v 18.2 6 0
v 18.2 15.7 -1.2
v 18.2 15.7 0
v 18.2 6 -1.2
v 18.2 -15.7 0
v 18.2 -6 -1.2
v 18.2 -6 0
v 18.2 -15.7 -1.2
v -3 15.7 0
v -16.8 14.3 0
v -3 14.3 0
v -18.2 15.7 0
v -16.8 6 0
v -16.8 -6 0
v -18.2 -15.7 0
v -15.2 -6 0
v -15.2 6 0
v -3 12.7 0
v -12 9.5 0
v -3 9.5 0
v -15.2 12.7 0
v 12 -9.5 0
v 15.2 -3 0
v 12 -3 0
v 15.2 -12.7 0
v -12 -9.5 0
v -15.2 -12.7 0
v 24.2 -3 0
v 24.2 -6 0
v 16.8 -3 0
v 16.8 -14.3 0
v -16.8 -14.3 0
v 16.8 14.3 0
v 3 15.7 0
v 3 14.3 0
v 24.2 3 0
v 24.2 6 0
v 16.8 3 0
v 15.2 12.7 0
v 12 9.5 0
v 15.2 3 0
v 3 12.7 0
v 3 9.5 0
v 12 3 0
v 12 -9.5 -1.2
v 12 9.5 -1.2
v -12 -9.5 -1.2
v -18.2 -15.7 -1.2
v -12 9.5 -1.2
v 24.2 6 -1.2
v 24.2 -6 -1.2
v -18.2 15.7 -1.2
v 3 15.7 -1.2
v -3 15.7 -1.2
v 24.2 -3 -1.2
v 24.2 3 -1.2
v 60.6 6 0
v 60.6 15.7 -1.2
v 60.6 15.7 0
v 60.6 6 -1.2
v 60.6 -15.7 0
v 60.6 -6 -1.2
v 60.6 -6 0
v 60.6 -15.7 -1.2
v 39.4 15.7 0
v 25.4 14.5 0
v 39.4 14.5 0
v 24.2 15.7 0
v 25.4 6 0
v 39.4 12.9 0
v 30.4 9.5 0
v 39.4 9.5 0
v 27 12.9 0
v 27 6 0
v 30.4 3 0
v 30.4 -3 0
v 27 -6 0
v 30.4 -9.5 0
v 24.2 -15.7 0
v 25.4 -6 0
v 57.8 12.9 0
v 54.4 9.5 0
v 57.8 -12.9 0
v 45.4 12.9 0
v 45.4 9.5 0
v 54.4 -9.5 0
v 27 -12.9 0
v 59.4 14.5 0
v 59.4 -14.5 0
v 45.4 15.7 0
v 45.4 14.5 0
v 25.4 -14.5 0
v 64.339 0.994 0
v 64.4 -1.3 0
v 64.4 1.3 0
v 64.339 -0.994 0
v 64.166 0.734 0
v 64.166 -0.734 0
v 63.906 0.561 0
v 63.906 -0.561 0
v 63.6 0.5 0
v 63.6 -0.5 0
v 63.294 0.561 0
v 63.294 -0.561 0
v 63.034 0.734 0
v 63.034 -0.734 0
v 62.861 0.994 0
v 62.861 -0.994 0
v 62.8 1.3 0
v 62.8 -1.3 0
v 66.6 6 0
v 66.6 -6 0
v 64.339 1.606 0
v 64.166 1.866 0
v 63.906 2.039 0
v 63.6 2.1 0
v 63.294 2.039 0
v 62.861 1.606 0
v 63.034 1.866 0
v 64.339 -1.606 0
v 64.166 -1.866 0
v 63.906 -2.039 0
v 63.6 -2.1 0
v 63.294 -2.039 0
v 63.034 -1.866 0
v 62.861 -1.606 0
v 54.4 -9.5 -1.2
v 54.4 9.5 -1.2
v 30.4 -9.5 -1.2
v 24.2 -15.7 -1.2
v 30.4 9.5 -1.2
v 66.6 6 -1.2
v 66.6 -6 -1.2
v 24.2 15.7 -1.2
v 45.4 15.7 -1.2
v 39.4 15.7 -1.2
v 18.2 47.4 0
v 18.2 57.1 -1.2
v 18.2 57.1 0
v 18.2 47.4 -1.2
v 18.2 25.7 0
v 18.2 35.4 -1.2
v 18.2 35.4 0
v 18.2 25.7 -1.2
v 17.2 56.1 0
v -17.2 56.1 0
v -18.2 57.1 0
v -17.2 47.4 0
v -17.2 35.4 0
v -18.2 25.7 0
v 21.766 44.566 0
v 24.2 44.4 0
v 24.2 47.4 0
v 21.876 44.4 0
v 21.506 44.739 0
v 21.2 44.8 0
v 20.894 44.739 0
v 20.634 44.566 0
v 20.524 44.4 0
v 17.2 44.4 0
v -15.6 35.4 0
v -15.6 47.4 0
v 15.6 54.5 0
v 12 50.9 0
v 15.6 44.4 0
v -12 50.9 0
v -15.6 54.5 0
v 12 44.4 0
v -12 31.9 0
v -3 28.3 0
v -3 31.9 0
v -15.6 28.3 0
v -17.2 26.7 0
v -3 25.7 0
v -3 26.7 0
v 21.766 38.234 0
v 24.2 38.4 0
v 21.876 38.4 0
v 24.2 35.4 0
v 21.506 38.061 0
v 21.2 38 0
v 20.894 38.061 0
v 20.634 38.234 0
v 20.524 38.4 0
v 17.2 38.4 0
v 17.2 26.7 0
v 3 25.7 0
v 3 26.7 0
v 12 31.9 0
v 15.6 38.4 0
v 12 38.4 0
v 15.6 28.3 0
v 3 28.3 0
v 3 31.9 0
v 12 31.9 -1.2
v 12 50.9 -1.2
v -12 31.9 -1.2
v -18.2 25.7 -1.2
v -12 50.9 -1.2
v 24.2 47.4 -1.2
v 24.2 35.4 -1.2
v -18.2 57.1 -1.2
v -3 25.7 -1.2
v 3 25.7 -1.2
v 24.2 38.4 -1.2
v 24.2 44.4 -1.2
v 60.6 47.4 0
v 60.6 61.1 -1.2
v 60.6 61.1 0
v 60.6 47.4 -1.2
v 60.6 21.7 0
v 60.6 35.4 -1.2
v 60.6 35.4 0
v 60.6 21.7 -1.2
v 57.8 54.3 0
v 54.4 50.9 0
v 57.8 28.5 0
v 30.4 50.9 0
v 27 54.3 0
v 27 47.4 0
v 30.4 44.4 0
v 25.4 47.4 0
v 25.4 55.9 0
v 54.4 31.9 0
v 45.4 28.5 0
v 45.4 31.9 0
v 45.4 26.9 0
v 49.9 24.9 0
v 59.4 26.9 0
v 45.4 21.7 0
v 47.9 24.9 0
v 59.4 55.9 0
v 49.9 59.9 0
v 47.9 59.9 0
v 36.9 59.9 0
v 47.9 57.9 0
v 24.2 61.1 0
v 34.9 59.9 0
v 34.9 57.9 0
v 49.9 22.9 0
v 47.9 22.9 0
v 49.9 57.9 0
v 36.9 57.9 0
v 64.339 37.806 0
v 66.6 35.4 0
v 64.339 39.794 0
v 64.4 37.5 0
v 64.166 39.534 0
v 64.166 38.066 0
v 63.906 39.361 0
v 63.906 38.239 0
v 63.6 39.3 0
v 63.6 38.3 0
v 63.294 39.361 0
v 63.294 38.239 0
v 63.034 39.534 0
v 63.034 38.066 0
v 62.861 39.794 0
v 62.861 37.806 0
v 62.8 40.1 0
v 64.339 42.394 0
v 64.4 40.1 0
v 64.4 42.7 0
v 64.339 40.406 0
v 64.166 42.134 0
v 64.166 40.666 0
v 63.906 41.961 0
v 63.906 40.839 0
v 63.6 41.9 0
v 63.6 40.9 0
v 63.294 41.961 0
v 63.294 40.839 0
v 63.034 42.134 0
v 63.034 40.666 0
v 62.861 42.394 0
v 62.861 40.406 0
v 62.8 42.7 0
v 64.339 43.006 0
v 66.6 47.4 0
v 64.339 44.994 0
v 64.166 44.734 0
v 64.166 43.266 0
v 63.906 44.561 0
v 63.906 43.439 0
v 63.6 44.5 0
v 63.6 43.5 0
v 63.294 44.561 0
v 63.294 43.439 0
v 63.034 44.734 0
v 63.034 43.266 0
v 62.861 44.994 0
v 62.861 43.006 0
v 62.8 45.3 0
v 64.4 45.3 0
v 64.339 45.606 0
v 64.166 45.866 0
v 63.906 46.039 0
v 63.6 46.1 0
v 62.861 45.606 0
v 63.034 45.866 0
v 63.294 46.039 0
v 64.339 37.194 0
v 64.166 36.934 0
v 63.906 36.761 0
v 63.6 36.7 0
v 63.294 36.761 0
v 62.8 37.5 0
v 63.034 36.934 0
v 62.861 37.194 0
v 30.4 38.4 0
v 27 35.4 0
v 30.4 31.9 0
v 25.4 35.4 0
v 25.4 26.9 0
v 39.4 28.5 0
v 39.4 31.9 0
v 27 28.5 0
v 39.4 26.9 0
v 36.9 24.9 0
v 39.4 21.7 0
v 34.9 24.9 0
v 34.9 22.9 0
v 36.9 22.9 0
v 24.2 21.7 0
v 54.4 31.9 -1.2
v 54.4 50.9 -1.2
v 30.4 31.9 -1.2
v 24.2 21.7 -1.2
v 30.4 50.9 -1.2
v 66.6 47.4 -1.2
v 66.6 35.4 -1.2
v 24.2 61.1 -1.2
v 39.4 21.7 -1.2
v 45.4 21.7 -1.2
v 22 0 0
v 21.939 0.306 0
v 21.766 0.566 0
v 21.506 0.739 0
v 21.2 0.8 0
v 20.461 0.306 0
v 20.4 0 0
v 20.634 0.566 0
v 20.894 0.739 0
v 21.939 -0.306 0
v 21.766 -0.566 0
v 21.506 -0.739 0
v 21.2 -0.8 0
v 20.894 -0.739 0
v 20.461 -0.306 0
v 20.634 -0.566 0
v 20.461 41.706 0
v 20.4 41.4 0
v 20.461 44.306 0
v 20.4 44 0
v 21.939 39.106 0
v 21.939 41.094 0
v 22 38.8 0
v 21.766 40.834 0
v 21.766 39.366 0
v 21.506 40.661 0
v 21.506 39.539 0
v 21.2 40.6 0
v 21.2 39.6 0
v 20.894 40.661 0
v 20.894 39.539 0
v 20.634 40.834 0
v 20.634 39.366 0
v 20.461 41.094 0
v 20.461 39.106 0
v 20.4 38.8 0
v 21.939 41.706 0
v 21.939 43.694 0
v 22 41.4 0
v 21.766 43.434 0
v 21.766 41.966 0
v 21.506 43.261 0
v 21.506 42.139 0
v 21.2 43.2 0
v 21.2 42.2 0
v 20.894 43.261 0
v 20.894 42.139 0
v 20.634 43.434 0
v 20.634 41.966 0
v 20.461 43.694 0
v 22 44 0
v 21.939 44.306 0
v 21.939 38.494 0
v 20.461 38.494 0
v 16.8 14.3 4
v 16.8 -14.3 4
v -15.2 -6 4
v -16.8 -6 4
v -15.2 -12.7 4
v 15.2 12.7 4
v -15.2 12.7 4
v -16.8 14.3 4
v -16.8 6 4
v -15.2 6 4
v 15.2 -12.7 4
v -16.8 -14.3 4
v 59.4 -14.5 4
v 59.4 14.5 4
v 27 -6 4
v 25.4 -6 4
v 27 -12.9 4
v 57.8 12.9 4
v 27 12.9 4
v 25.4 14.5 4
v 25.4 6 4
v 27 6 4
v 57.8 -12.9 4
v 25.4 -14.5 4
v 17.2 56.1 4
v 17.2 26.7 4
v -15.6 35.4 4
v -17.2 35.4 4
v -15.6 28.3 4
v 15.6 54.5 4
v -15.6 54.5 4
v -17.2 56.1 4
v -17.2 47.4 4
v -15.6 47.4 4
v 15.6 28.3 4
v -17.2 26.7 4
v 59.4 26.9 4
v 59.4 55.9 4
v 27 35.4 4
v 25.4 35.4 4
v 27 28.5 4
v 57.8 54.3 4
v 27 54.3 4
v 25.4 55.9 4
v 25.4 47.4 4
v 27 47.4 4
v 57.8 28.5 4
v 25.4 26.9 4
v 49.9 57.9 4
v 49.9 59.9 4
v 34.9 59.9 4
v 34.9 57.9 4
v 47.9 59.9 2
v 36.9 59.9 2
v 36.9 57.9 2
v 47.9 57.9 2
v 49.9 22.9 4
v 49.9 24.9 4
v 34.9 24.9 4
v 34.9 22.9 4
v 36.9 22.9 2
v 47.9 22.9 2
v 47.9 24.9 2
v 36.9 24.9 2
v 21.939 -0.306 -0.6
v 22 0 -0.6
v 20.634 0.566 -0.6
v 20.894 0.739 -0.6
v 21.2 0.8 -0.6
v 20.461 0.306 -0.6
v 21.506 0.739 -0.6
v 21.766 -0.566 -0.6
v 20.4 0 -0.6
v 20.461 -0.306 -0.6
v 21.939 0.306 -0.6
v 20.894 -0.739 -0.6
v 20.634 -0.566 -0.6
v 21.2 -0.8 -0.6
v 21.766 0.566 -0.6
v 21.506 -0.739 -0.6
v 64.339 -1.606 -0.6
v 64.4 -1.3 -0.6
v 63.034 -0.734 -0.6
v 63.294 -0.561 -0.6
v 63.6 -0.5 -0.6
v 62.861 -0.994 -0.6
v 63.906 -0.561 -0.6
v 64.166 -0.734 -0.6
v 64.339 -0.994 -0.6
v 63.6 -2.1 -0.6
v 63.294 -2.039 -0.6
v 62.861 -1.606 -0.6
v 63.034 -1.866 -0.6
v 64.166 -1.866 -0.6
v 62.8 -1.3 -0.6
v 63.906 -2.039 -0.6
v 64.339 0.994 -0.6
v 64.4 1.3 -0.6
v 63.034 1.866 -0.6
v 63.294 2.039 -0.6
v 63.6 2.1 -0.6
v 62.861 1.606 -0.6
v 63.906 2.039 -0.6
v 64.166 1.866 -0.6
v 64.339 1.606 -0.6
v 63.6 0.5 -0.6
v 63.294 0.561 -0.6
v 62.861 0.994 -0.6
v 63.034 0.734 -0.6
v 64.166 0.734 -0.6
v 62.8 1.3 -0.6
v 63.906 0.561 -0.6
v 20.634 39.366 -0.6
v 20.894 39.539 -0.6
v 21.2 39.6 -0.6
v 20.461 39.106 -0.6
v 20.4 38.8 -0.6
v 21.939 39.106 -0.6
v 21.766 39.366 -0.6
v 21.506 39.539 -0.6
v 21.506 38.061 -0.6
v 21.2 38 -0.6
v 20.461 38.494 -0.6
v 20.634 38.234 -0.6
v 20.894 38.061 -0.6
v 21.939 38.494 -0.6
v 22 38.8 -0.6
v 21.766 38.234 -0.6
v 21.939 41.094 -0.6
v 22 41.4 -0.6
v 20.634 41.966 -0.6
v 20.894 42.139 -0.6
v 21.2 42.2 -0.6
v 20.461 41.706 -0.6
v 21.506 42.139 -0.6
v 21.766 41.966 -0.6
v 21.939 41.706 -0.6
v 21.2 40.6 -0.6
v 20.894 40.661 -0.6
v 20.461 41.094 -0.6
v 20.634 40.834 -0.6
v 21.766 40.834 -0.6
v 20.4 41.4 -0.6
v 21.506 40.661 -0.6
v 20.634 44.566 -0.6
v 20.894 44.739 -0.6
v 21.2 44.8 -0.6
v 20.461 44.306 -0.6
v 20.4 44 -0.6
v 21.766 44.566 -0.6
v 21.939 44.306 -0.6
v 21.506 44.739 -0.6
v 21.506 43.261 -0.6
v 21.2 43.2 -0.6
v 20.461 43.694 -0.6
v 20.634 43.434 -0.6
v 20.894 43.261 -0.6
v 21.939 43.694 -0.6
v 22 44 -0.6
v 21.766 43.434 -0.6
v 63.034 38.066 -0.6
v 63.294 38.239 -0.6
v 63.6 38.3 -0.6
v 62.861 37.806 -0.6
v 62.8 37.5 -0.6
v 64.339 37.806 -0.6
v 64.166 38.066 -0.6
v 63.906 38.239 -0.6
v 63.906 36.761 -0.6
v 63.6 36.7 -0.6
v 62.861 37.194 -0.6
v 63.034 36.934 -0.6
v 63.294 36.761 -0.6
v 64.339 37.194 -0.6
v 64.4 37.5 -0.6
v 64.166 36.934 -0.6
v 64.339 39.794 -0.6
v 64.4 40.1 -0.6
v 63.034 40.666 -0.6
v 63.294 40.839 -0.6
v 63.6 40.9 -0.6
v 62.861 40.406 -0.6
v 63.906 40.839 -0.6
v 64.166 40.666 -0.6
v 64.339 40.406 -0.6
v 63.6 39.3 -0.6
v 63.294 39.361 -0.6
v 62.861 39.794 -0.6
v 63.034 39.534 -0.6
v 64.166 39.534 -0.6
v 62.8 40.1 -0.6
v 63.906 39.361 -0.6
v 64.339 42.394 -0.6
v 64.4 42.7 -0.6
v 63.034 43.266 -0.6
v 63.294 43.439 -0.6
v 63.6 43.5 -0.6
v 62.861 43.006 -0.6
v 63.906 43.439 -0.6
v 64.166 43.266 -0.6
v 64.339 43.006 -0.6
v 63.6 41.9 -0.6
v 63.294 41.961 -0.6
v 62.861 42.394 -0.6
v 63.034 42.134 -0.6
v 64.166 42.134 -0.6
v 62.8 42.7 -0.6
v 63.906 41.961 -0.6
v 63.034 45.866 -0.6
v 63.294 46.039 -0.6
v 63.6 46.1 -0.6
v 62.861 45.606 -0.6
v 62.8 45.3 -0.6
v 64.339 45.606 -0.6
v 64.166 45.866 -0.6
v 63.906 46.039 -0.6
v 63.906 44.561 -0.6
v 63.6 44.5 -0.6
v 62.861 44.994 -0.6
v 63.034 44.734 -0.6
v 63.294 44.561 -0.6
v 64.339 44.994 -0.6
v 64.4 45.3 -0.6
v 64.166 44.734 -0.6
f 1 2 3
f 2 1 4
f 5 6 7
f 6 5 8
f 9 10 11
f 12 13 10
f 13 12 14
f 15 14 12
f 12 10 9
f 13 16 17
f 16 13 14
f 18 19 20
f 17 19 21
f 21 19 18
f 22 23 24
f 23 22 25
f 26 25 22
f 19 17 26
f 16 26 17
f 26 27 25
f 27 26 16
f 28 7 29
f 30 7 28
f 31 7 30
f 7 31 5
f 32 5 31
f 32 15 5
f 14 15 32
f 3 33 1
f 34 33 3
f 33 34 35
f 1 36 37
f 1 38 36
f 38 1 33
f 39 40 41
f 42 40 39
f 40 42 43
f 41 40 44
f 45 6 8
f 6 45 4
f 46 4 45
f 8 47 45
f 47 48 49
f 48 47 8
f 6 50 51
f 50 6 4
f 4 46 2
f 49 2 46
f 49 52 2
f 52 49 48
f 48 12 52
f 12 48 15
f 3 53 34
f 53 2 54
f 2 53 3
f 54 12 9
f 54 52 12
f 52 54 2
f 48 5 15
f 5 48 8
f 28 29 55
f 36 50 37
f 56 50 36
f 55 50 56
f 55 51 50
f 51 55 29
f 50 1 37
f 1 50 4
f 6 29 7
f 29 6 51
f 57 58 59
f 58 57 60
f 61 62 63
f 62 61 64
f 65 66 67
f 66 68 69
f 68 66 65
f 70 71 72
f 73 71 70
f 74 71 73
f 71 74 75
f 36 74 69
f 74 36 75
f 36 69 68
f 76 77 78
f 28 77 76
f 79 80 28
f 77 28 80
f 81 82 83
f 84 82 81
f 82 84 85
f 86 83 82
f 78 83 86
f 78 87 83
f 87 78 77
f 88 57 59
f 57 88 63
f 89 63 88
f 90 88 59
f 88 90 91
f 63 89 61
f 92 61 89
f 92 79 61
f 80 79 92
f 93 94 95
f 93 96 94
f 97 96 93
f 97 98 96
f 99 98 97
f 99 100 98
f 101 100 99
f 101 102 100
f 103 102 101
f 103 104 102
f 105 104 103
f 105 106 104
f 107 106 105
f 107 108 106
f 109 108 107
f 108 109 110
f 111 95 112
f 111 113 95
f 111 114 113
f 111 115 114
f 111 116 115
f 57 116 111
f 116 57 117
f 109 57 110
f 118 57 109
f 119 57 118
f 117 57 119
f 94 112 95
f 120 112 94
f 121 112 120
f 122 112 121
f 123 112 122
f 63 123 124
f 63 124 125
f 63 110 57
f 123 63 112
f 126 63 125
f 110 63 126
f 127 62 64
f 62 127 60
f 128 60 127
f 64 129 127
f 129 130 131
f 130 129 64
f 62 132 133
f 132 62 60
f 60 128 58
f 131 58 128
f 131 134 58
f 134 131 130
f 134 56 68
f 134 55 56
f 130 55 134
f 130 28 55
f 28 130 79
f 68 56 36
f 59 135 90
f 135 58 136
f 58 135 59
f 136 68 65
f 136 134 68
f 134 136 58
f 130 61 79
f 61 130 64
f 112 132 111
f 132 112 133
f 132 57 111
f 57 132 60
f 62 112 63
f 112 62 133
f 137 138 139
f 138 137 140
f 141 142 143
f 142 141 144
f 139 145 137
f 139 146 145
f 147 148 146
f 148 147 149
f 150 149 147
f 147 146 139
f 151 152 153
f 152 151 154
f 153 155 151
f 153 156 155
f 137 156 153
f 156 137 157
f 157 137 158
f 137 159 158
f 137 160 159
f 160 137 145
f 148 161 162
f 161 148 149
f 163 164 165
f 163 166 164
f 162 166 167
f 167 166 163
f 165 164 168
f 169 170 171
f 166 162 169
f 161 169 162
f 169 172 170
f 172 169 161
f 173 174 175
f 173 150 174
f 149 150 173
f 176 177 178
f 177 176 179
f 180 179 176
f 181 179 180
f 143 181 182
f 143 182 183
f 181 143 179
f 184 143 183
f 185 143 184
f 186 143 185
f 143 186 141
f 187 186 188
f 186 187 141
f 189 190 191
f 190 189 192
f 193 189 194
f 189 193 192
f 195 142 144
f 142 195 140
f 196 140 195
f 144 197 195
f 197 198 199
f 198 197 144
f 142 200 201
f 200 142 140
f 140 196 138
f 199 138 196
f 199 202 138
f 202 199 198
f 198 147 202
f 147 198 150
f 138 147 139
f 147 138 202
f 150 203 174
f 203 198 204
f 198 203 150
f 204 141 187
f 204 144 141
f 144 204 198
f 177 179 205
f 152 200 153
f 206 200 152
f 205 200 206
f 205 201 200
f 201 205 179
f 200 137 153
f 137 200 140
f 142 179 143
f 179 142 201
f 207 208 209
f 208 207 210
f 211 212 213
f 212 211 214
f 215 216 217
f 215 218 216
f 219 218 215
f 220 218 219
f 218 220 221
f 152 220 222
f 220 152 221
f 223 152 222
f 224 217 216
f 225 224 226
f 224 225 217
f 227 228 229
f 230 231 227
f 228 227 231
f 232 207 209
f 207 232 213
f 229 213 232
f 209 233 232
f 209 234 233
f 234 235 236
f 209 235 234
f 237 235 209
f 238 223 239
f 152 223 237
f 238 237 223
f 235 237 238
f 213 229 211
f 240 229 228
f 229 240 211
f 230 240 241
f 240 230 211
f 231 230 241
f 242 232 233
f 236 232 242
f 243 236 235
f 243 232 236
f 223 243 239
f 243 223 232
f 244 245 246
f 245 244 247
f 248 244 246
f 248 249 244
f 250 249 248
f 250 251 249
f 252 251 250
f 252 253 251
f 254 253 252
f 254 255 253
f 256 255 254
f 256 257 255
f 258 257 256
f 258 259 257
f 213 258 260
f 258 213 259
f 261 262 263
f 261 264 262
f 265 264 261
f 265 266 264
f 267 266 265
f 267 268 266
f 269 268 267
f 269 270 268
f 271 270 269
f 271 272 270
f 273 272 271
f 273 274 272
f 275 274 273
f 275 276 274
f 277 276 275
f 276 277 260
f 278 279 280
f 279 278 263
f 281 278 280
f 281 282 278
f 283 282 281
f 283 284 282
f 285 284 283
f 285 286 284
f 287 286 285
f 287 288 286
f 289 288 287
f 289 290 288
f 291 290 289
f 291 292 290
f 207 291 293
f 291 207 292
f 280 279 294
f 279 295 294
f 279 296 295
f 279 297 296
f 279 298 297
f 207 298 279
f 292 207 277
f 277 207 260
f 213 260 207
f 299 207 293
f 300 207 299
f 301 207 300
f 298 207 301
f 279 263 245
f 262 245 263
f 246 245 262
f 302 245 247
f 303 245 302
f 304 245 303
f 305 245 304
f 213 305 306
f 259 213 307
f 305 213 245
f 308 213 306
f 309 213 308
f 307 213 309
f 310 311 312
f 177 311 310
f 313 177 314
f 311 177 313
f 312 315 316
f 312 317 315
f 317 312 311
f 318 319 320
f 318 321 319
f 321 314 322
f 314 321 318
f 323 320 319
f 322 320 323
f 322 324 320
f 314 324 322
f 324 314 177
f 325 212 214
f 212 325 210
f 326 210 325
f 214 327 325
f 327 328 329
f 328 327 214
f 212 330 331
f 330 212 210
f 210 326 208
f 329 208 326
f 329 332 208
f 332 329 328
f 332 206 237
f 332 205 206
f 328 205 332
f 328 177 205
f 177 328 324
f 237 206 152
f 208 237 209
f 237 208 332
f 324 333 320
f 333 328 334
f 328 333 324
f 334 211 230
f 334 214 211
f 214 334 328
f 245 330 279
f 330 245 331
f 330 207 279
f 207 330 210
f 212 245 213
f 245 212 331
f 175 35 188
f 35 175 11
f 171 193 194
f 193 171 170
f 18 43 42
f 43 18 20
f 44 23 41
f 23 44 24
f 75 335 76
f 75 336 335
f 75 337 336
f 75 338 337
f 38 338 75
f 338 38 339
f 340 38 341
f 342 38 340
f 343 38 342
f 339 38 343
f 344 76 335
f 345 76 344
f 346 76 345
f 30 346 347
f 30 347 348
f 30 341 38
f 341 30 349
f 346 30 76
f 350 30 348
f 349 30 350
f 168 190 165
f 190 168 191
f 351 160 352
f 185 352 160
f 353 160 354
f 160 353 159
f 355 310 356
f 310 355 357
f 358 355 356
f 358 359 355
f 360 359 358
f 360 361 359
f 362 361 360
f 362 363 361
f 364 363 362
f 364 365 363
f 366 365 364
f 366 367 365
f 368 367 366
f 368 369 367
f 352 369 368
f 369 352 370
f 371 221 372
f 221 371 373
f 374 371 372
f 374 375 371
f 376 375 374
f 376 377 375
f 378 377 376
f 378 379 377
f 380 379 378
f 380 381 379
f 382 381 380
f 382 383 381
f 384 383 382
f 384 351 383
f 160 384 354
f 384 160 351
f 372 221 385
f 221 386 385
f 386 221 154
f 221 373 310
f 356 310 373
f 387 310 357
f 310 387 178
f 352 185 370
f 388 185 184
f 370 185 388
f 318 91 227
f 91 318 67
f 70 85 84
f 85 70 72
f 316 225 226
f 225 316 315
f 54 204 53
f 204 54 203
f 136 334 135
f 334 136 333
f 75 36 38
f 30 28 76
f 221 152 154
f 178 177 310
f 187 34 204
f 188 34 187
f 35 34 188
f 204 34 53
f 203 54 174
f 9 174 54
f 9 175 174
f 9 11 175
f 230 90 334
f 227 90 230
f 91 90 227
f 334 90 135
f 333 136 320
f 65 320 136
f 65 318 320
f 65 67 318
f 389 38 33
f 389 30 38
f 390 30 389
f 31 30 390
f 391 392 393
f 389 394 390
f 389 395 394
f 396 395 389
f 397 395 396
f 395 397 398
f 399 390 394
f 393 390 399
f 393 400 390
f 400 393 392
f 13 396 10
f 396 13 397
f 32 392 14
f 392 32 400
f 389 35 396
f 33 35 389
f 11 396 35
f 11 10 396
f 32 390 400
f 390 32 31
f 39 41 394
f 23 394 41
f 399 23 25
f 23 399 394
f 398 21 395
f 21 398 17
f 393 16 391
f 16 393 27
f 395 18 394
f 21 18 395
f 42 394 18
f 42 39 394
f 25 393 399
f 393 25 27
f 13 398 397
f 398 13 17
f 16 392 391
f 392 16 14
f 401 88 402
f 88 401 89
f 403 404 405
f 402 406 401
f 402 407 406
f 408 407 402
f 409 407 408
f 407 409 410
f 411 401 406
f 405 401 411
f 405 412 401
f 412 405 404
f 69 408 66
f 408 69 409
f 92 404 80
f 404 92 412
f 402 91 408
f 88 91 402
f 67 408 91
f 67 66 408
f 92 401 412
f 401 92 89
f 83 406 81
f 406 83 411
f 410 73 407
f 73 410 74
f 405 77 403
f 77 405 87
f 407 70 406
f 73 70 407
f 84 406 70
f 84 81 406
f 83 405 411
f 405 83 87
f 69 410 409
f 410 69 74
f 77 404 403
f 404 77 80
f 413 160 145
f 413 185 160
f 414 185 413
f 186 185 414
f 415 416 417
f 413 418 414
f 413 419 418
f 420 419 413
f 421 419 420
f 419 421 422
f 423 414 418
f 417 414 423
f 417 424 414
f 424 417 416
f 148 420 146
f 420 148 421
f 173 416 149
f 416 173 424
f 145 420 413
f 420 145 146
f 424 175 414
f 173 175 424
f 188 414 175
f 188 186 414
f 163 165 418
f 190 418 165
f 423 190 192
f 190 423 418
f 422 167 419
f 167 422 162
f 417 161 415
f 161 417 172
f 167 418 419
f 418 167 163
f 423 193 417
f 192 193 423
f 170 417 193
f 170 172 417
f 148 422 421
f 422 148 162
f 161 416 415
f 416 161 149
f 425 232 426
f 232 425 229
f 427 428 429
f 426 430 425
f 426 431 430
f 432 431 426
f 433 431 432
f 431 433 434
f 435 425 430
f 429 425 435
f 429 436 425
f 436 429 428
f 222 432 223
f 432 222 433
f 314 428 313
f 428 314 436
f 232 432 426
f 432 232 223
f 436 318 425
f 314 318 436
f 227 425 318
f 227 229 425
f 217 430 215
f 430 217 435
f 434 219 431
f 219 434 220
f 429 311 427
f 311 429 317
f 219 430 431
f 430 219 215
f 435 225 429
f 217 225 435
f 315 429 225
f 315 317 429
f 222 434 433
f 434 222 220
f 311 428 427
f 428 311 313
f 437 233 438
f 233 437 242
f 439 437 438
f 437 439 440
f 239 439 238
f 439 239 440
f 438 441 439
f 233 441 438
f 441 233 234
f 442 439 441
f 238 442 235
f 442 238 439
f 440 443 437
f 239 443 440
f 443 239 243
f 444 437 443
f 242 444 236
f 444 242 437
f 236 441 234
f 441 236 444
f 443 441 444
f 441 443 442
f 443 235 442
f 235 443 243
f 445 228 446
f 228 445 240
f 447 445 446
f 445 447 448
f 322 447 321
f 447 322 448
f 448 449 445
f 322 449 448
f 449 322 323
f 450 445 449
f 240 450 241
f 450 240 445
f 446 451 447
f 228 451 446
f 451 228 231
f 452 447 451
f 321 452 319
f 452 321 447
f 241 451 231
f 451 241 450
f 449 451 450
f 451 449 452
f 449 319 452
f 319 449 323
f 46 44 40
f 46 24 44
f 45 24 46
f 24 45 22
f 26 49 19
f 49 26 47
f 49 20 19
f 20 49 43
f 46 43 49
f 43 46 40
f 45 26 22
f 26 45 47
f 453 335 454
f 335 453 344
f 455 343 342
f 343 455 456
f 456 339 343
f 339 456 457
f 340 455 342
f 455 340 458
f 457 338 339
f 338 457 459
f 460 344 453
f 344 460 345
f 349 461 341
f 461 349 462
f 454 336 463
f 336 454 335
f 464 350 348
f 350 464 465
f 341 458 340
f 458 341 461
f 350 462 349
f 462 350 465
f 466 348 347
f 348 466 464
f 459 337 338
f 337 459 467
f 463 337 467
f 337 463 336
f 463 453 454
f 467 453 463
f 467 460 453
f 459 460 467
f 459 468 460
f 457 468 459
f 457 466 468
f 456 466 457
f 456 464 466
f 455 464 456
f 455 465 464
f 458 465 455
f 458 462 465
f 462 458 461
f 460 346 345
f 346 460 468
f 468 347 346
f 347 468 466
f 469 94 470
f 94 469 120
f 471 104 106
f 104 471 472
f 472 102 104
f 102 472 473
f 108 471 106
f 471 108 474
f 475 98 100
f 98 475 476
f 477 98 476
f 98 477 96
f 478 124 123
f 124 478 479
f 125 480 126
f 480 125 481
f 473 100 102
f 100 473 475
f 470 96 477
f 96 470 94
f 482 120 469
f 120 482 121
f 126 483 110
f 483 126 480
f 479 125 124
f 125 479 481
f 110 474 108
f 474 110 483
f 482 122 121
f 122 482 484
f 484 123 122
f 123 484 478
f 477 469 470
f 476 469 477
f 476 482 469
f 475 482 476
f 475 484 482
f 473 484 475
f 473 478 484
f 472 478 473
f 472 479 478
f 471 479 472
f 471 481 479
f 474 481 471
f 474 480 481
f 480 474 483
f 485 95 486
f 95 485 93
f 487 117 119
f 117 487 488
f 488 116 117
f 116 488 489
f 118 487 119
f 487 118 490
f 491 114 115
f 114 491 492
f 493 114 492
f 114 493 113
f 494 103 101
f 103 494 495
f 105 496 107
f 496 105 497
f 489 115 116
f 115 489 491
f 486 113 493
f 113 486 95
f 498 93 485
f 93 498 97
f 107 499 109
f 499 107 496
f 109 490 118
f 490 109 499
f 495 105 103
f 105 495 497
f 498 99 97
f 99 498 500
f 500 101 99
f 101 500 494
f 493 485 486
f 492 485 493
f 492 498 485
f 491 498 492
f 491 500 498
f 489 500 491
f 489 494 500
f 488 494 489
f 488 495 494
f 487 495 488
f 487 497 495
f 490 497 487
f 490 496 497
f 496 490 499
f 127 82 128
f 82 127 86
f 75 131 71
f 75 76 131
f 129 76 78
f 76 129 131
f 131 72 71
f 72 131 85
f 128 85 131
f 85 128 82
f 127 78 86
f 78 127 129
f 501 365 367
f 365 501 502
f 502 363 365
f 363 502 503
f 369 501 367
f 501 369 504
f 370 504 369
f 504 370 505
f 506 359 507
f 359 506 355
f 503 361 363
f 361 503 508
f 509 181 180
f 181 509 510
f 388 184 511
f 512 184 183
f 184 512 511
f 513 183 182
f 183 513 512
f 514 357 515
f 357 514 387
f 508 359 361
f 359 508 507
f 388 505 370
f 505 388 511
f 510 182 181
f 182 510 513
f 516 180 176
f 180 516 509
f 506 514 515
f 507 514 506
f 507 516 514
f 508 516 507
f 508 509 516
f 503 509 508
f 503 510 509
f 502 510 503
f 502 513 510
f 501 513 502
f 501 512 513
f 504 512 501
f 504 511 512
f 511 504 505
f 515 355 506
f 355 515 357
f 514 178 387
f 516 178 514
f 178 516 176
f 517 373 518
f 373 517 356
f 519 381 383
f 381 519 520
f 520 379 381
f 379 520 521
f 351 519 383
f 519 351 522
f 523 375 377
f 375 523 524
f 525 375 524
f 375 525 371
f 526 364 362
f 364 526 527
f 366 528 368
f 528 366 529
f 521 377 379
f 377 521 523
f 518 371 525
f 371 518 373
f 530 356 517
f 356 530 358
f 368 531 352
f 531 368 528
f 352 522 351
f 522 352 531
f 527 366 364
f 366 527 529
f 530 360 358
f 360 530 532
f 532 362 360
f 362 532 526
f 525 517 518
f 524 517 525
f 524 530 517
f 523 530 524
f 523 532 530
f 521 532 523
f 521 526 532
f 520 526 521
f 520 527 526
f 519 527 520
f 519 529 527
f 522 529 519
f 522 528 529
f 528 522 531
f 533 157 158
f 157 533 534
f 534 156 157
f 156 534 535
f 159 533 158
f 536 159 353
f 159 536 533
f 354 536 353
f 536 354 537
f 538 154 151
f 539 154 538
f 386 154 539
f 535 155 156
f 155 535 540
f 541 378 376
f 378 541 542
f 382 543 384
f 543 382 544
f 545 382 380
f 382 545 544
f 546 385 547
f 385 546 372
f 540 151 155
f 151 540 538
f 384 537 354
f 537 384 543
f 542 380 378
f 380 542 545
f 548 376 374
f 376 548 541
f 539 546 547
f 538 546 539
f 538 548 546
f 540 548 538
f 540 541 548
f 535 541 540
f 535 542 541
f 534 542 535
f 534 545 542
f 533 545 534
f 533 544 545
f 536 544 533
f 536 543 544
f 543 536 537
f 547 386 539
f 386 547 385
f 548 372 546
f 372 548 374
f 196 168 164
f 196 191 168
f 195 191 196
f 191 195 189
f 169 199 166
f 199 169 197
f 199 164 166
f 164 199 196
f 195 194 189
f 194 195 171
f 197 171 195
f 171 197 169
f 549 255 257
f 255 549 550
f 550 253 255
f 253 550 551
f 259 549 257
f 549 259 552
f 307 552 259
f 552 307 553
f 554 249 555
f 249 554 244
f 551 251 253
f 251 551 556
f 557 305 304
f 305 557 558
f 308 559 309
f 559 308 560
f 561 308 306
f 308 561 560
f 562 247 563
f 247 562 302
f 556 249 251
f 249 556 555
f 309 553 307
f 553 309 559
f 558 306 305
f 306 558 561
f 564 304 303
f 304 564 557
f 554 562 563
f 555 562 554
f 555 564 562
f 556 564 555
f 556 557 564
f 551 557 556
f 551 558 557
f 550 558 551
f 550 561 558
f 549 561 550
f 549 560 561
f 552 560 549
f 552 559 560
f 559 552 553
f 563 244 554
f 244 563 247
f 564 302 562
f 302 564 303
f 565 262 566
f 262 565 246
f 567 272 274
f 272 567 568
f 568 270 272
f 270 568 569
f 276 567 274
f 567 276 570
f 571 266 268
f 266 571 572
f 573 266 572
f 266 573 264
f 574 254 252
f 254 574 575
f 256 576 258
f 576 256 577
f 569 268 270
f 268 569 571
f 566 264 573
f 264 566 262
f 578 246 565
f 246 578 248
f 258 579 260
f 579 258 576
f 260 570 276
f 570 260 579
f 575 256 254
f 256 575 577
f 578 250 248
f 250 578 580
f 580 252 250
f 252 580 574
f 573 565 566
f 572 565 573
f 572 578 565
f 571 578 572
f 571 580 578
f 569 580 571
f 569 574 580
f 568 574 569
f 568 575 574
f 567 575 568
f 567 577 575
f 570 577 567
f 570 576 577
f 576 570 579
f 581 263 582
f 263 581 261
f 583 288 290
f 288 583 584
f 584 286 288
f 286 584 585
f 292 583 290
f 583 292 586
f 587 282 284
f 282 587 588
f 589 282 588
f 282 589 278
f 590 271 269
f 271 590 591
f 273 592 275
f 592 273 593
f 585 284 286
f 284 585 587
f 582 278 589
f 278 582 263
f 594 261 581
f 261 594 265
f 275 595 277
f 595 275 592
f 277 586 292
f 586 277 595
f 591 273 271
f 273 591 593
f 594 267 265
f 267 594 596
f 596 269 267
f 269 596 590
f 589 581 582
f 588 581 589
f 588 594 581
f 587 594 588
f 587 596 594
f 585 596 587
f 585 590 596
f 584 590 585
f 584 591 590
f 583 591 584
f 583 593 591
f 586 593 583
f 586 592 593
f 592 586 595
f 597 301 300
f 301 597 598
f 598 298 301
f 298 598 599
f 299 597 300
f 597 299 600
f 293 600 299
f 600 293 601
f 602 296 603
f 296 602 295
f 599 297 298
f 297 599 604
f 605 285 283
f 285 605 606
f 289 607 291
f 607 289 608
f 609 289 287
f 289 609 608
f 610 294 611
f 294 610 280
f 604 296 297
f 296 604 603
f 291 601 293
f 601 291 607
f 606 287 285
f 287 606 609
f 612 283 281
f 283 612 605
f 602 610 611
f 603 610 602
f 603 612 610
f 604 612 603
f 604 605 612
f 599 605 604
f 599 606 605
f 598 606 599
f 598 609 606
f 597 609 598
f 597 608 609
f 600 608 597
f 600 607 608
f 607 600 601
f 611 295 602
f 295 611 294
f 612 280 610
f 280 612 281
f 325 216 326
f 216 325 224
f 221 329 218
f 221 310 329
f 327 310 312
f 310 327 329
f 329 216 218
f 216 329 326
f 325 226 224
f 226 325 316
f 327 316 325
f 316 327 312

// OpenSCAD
// file: ../../util/marks.scad
//-----------------------------------------------------------------------
// Marks for fit pieces: n dots in a row, engraved into a face, so each
// variant can be told apart after printing. Origin: centre of the row, on
// the face; the dots cut down into -Z. Units: mm.
//-----------------------------------------------------------------------

markDotDia   = 1.6;
markDotPitch = 2.6;
markDotDepth = 0.6;

module markDots(n)
{
  for (i = [0 : n - 1])
    translate([(i - (n - 1)/2)*markDotPitch, 0, -markDotDepth])
      cylinder(d = markDotDia, h = markDotDepth + 1, $fn = 16);
}
// file: lipo-cradle.scad
//-----------------------------------------------------------------------
// LiPo pouch cell, in a low open cradle on the floor
//
// A low wall round the pack's footprint, with a gap on one side for the
// lead. The pack drops in and the lid (or a strap) keeps it down. Optional
// strap bars on the two long sides take a hook-and-loop strap over the pack:
// the strap goes down outside the wall, under the bar, and back up.
//
// Modules, all in the same frame:
//   lipoGhost()    the pack, for previews
//   lipoCradle()   the plastic: wall, lead gap, optional strap bars
//   lipoBody()     the pack as a plain solid (views, collision checks)
//
// Frame: origin on the floor top, at the centre of the pack's footprint.
// X along the pack's length (the tab and lead at -X), Y across its width,
// Z up. Units: mm.
//
// Sizes: the pouch code on the label, TTWWLL = thickness in tenths of a mm,
// width, length in whole mm (602530 = 6.0 x 25 x 30). Named packs are in
// lipoPacks; lipoCodeDims("503035") decodes any other code. Codes are the
// CELL: a pack with its protection board folded at the tab end is a few mm
// longer, and pouches swell, so measure the pack and use the allowances.
//
// Use with `use <.../components/lipo-cradle/lipo-cradle.scad>`.
//-----------------------------------------------------------------------

//-- [name, thickness, width, length, note]. The cell sizes from the code, except where measured
lipoPacks = [
  ["402030",  4.0, 20, 30, ""],
  ["502030",  5.0, 20, 30, ""],
  ["602530",  6.0, 25, 30, "500 mAh in use, controller project (label read 2026-10-30)"],
  ["503035",  5.0, 30, 35, ""],
  ["403048",  4.0, 30, 48, ""],
  ["603048",  6.0, 30, 48, ""],
  ["503450",  5.0, 34, 50, ""],
  ["603450",  6.0, 34, 50, ""],
  ["103450", 10.0, 34, 50, "the 10 is whole mm: 1800-2000 mAh"],
  ["902030",  9.0, 20, 30, ""],
  ["605060",  6.0, 50, 60, ""],
  ["803860",  8.0, 38, 60, "2000 mAh class"],
  ["PKCell-2000", 8.0, 38, 60, "Pi Hut 105187, 2000 mAh, vendor size; lead 100, JST-PH"],
];

//-- decode a six-digit code: TT in tenths of a mm (20 and up), WW, LL in mm.
//-- Codes starting with 1 (10-19) are ambiguous (103450 is 10 mm thick): put them in lipoPacks
function lipoCodeDims(code) =
  let (d = [for (c = code) ord(c) - 48],
       t = d[0]*10 + d[1])
  assert(len(code) == 6 && min(d) >= 0 && max(d) <= 9, str("not a six-digit pouch code: ", code))
  assert(t >= 20, str("ambiguous thickness in ", code, ": add it to lipoPacks"))
  [t/10, d[2]*10 + d[3], d[4]*10 + d[5]];

//-- [thickness, width, length] by name, or decoded from the code
function lipoDims(name) = let (i = search([name], lipoPacks)[0])
  (i != [] && i != undef) ? [lipoPacks[i][1], lipoPacks[i][2], lipoPacks[i][3]] : lipoCodeDims(name);

lipoDefault    = "602530";

//-- The cradle
lipoClearance  = 0.4;     // each side, pack to wall (controller base fitClearance). CAL by the fit piece
lipoWall       = 1.6;
lipoWallH      = 4;       // above the floor (controller base: 4 for a 6 thick pack)
lipoLeadGap    = 12;      // gap in the wall for the lead (controller base: 12)
lipoPcmAllow   = 0;       // added to the length at the tab end, for a protection board past the cell: CAL
lipoSwell      = 0.10;    // allow 10 % on the thickness for a pouch swelling with age
lipoTopGap     = 0.5;     // above the swollen pack, under the lid
//-- strap bars: off unless strap > 0 (the strap's width)
lipoStrapGap   = 2.0;     // wall to bar, and floor to bar: room for the strap
lipoStrapBar   = 2.0;     // bar thickness (Y) and height (Z)
lipoStrapPost  = 2.0;     // posts each end of the bar

//-- headroom over the floor the lid must clear
function lipoHeadroom(name = lipoDefault, swell = lipoSwell) = lipoDims(name)[0]*(1 + swell) + lipoTopGap;

module lipoBody(name = lipoDefault, pcm = lipoPcmAllow)
{
  d = lipoDims(name);
  translate([-d[2]/2 - pcm, -d[1]/2, 0]) cube([d[2] + pcm, d[1], d[0]]);
}

module lipoGhost(name = lipoDefault, pcm = lipoPcmAllow)
{
  d = lipoDims(name);
  %color("Silver") lipoBody(name, pcm);
  //-- the lead, out of the tab end
  for (s = [-1, 1])
    %color(s < 0 ? "Black" : "Red") translate([-d[2]/2 - pcm - 15, s*1.2 - 0.6, d[0]/2 - 0.6]) cube([15, 1.2, 1.2]);
}

//-- leadSide: "-x" (default, the tab end), "+x", "-y", "+y". strap: strap width, 0 for none
module lipoCradle(name = lipoDefault, clearance = lipoClearance, h = lipoWallH, leadSide = "-x",
                  gap = lipoLeadGap, pcm = lipoPcmAllow, strap = 0)
{
  d = lipoDims(name);
  lx = d[2] + pcm; ly = d[1];
  x0 = -d[2]/2 - pcm;                                    // pack's -X end
  c = clearance; w = lipoWall;
  assert(gap < min(lx, ly) - 2, "lead gap wider than the side it's in");
  translate([0, 0, -0.01])
    difference()
    {
      translate([x0 - c - w, -ly/2 - c - w, 0]) cube([lx + 2*(c + w), ly + 2*(c + w), h + 0.01]);
      translate([x0 - c, -ly/2 - c, -1]) cube([lx + 2*c, ly + 2*c, h + 2]);
      //-- lead gap, centred on its side
      if (leadSide == "-x") translate([x0 - c - w - 1, -gap/2, -1]) cube([w + 2, gap, h + 2]);
      if (leadSide == "+x") translate([x0 + lx + c - 1, -gap/2, -1]) cube([w + 2, gap, h + 2]);
      if (leadSide == "-y") translate([x0 + lx/2 - gap/2, -ly/2 - c - w - 1, -1]) cube([gap, w + 2, h + 2]);
      if (leadSide == "+y") translate([x0 + lx/2 - gap/2, ly/2 + c - 1, -1]) cube([gap, w + 2, h + 2]);
    }
  //-- strap bars on the long sides, across the middle of the pack
  if (strap > 0)
    for (m = [0, 1])
      mirror([0, m, 0])
        translate([x0 + lx/2, ly/2 + c + w + lipoStrapGap, -0.01])
          difference()
          {
            translate([-strap/2 - 0.5 - lipoStrapPost, 0, 0])
              cube([strap + 1 + 2*lipoStrapPost, lipoStrapBar, lipoStrapGap + lipoStrapBar + 0.01]);
            translate([-strap/2 - 0.5, -1, -1]) cube([strap + 1, lipoStrapBar + 2, lipoStrapGap + 1.01]);
          }
}
// main file
//-----------------------------------------------------------------------
// Fit piece: four cradles for the 602530 pack in a 2 x 2 grid on an open
// floor, marked 1 to 4 dots beside each. Drop the pack in each: does it go
// in without forcing, and how much does it slide about?
//
//   1  clearance 0.2
//   2  clearance 0.4
//   3  clearance 0.6
//   4  clearance 0.4, with strap bars for a 10 wide hook-and-loop strap
//
// The floor is a frame (open under each pack) to save plastic. Set `name`
// for another pack, `pcm` if its protection board makes it longer.
// Prints base down, as exported, no supports. Units: mm.
//-----------------------------------------------------------------------

use <lipo-cradle.scad>
use <../../util/marks.scad>

name      = "602530";
pcm       = 0;
baseThick = 1.2;
rim       = 3;       // solid floor inside each wall
strapW    = 10;

stations  = [ [0.2, 0], [0.4, 0], [0.6, 0], [0.4, strapW] ];   // [clearance, strap]

d  = lipoDims(name);
lx = d[2] + pcm; ly = d[1];
out = 0.6 + 1.6;                                   // widest clearance + wall
px = lx + 2*out + 8;                               // room for the dots between
py = ly + 2*(out + 2 + 2) + 4;                     // room for the strap bars
pos = [[0, 0], [px, 0], [0, py], [px, py]];

difference()
{
  union()
  {
    //-- a floor pad under each cradle (and its dots), joined by two bars
    for (i = [0 : 3])
      translate([pos[i][0], pos[i][1], -baseThick])
      {
        sy = ly/2 + out + 1 + (stations[i][1] > 0 ? 4 : 0);
        translate([-lx/2 - pcm/2 - out - 1, -sy, 0]) cube([lx + 2*out + 2, 2*sy, baseThick]);
        translate([lx/2 - pcm/2, -6, 0]) cube([out + 7, 12, baseThick]);    // tab for the dots
      }
    for (y = [0, py]) translate([0, y - 3, -baseThick]) cube([px, 6, baseThick]);
    for (x = [0, px]) translate([x - 3, 0, -baseThick]) cube([6, py, baseThick]);
    for (i = [0 : 3])
      translate([pos[i][0], pos[i][1], 0])
        lipoCradle(name, clearance = stations[i][0], pcm = pcm, strap = stations[i][1]);
  }
  for (i = [0 : 3])
    translate([pos[i][0], pos[i][1], 0])
    {
      translate([-lx/2 - pcm/2 + rim, -ly/2 + rim, -baseThick - 1]) cube([lx - 2*rim, ly - 2*rim, baseThick + 2]);
      translate([lx/2 - pcm/2 + out + 4, 0, 0]) rotate([0, 0, 90]) markDots(i + 1);
    }
}

if ($preview)
  for (i = [0 : 3]) translate([pos[i][0], pos[i][1], 0]) lipoGhost(name, pcm);
